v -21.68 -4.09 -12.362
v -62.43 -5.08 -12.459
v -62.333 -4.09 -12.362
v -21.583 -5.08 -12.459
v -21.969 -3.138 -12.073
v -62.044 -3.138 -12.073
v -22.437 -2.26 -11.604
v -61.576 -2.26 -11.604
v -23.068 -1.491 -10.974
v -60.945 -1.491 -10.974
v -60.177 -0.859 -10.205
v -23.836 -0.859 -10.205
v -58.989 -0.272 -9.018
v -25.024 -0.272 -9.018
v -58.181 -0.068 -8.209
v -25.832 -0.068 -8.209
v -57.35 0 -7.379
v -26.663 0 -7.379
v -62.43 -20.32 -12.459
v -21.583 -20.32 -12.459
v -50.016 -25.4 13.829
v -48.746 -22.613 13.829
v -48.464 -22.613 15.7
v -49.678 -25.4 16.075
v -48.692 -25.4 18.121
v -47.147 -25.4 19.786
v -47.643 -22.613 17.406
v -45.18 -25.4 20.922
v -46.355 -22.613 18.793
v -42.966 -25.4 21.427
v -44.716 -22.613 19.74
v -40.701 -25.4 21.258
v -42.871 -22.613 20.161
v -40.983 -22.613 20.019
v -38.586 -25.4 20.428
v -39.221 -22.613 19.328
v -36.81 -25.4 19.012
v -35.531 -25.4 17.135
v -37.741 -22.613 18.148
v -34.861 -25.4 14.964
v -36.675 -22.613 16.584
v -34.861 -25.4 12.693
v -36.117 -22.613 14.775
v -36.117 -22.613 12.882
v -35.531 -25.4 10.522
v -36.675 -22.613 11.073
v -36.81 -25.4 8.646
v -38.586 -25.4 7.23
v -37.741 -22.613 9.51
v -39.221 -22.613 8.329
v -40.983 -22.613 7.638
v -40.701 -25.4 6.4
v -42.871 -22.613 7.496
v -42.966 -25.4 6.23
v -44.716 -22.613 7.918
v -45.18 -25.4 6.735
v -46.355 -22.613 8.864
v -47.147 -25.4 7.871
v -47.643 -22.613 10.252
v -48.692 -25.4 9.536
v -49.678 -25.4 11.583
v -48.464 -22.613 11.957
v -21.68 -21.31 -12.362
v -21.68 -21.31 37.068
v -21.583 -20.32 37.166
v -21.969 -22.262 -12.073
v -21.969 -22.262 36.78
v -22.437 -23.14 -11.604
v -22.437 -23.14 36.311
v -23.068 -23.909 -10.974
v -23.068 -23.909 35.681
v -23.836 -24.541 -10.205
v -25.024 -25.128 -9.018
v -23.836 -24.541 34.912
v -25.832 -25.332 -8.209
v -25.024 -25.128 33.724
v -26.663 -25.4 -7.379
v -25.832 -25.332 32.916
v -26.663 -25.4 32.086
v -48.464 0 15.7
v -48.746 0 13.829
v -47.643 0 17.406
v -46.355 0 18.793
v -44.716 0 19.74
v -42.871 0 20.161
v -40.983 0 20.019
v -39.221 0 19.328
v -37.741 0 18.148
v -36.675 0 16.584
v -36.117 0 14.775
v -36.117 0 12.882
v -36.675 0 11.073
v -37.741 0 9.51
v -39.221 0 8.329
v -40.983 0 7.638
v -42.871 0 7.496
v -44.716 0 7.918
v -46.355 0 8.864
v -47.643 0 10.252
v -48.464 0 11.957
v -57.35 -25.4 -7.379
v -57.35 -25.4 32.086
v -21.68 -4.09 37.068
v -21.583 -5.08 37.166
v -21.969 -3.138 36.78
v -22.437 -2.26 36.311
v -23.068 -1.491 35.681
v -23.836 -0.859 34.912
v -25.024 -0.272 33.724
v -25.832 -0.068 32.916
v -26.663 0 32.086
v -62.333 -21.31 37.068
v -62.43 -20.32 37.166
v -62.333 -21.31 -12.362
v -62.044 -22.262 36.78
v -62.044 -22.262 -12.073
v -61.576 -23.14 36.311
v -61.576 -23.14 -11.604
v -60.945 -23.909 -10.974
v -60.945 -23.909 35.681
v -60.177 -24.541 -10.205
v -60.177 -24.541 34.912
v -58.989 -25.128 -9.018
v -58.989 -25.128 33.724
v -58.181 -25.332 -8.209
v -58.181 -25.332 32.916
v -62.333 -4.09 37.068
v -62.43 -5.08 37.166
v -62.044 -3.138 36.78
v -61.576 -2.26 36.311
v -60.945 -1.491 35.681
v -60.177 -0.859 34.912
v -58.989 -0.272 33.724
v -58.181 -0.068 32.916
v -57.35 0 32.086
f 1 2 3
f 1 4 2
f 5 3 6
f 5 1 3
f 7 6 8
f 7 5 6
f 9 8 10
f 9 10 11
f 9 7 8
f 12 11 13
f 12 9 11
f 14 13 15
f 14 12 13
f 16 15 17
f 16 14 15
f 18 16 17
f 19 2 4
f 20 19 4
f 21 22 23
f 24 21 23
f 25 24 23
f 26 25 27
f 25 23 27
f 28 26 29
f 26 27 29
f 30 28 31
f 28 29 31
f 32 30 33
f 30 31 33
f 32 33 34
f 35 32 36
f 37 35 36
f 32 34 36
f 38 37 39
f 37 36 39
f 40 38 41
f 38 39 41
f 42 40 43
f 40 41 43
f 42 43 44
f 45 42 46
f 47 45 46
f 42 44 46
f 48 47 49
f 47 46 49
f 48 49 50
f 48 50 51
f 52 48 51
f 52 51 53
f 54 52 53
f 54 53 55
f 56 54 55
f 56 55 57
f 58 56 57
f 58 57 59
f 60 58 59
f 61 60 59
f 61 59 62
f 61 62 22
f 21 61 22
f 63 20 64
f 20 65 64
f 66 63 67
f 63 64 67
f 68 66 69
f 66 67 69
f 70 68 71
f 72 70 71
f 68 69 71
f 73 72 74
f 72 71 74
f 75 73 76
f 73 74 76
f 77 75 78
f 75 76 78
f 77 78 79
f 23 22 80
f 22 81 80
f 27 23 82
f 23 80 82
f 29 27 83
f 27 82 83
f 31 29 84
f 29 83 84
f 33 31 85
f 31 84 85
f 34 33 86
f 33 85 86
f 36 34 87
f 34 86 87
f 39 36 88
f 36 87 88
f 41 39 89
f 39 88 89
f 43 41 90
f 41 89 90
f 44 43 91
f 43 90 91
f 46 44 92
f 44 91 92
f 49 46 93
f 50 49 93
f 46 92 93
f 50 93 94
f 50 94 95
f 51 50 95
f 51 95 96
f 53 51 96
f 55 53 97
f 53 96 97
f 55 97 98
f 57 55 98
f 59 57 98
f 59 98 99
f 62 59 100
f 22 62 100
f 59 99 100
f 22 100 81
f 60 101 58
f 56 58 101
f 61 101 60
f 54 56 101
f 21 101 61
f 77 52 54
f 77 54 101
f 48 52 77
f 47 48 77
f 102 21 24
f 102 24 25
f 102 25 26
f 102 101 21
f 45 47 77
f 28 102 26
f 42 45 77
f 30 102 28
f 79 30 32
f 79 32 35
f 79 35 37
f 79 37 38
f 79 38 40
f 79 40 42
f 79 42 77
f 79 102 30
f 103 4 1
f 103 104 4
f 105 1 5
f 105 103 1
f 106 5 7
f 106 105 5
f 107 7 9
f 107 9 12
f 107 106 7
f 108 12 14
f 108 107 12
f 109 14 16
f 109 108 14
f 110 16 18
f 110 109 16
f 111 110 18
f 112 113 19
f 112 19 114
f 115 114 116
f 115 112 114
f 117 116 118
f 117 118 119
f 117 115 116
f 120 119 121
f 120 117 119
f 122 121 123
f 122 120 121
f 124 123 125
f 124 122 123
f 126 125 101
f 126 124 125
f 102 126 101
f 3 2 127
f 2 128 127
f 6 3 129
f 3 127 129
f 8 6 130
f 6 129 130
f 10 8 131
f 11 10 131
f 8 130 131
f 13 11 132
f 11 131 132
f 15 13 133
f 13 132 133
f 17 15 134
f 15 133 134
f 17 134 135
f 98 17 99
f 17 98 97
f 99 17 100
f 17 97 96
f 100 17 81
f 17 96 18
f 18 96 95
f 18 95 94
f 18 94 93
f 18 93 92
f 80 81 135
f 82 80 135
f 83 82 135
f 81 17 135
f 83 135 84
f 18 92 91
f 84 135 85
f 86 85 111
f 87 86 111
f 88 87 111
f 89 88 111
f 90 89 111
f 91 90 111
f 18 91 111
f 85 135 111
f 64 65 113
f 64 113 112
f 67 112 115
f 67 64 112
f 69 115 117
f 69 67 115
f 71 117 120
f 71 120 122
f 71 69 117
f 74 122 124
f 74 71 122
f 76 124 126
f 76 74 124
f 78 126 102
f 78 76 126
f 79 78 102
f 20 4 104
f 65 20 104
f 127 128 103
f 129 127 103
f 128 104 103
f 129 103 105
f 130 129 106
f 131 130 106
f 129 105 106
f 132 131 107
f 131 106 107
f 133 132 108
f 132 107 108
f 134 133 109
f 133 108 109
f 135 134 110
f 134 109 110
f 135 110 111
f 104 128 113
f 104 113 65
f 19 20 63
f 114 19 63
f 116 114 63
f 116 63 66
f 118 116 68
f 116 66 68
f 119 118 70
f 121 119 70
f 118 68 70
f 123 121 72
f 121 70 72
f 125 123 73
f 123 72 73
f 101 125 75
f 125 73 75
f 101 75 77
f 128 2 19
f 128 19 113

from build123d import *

# Parameters (mm, degrees)
F0_W           = 40.847726
F0_H           = 49.624716
F1_DEPTH       = 25.4
F2_R           = 5.08
F4_D           = 12.7
F4_CSINK_D     = 15.24
F4_CSINK_ANGLE = 49


with BuildPart() as f1:
    # F0 (on Front) → F1 (new body)
    with BuildSketch(Plane.XZ):
        with Locations((-42.006526, 12.353429)):
            Rectangle(F0_W, F0_H)
    extrude(amount=F1_DEPTH)

    # F2
    f2_edges = [f1.edges().sort_by_distance(p)[0] for p in [
        (-42.006526, -25.4, 37.165787),
        (-62.430389, -25.4, 12.353429),
        (-42.006526, -25.4, -12.458929),
        (-21.582663, -25.4, 12.353429),
        (-42.006526, 0, 37.165787),
        (-62.430389, 0, 12.353429),
        (-42.006526, 0, -12.458929),
        (-21.582663, 0, 12.353429),
    ]]
    fillet(f2_edges, radius=F2_R)

    # F4 (through all)
    with Locations(Plane.XZ.offset(25.4)):
        with Locations((-42.396232, 13.828625)):
            CounterSinkHole(F4_D / 2, F4_CSINK_D / 2, counter_sink_angle=F4_CSINK_ANGLE)


solid = f1.part
